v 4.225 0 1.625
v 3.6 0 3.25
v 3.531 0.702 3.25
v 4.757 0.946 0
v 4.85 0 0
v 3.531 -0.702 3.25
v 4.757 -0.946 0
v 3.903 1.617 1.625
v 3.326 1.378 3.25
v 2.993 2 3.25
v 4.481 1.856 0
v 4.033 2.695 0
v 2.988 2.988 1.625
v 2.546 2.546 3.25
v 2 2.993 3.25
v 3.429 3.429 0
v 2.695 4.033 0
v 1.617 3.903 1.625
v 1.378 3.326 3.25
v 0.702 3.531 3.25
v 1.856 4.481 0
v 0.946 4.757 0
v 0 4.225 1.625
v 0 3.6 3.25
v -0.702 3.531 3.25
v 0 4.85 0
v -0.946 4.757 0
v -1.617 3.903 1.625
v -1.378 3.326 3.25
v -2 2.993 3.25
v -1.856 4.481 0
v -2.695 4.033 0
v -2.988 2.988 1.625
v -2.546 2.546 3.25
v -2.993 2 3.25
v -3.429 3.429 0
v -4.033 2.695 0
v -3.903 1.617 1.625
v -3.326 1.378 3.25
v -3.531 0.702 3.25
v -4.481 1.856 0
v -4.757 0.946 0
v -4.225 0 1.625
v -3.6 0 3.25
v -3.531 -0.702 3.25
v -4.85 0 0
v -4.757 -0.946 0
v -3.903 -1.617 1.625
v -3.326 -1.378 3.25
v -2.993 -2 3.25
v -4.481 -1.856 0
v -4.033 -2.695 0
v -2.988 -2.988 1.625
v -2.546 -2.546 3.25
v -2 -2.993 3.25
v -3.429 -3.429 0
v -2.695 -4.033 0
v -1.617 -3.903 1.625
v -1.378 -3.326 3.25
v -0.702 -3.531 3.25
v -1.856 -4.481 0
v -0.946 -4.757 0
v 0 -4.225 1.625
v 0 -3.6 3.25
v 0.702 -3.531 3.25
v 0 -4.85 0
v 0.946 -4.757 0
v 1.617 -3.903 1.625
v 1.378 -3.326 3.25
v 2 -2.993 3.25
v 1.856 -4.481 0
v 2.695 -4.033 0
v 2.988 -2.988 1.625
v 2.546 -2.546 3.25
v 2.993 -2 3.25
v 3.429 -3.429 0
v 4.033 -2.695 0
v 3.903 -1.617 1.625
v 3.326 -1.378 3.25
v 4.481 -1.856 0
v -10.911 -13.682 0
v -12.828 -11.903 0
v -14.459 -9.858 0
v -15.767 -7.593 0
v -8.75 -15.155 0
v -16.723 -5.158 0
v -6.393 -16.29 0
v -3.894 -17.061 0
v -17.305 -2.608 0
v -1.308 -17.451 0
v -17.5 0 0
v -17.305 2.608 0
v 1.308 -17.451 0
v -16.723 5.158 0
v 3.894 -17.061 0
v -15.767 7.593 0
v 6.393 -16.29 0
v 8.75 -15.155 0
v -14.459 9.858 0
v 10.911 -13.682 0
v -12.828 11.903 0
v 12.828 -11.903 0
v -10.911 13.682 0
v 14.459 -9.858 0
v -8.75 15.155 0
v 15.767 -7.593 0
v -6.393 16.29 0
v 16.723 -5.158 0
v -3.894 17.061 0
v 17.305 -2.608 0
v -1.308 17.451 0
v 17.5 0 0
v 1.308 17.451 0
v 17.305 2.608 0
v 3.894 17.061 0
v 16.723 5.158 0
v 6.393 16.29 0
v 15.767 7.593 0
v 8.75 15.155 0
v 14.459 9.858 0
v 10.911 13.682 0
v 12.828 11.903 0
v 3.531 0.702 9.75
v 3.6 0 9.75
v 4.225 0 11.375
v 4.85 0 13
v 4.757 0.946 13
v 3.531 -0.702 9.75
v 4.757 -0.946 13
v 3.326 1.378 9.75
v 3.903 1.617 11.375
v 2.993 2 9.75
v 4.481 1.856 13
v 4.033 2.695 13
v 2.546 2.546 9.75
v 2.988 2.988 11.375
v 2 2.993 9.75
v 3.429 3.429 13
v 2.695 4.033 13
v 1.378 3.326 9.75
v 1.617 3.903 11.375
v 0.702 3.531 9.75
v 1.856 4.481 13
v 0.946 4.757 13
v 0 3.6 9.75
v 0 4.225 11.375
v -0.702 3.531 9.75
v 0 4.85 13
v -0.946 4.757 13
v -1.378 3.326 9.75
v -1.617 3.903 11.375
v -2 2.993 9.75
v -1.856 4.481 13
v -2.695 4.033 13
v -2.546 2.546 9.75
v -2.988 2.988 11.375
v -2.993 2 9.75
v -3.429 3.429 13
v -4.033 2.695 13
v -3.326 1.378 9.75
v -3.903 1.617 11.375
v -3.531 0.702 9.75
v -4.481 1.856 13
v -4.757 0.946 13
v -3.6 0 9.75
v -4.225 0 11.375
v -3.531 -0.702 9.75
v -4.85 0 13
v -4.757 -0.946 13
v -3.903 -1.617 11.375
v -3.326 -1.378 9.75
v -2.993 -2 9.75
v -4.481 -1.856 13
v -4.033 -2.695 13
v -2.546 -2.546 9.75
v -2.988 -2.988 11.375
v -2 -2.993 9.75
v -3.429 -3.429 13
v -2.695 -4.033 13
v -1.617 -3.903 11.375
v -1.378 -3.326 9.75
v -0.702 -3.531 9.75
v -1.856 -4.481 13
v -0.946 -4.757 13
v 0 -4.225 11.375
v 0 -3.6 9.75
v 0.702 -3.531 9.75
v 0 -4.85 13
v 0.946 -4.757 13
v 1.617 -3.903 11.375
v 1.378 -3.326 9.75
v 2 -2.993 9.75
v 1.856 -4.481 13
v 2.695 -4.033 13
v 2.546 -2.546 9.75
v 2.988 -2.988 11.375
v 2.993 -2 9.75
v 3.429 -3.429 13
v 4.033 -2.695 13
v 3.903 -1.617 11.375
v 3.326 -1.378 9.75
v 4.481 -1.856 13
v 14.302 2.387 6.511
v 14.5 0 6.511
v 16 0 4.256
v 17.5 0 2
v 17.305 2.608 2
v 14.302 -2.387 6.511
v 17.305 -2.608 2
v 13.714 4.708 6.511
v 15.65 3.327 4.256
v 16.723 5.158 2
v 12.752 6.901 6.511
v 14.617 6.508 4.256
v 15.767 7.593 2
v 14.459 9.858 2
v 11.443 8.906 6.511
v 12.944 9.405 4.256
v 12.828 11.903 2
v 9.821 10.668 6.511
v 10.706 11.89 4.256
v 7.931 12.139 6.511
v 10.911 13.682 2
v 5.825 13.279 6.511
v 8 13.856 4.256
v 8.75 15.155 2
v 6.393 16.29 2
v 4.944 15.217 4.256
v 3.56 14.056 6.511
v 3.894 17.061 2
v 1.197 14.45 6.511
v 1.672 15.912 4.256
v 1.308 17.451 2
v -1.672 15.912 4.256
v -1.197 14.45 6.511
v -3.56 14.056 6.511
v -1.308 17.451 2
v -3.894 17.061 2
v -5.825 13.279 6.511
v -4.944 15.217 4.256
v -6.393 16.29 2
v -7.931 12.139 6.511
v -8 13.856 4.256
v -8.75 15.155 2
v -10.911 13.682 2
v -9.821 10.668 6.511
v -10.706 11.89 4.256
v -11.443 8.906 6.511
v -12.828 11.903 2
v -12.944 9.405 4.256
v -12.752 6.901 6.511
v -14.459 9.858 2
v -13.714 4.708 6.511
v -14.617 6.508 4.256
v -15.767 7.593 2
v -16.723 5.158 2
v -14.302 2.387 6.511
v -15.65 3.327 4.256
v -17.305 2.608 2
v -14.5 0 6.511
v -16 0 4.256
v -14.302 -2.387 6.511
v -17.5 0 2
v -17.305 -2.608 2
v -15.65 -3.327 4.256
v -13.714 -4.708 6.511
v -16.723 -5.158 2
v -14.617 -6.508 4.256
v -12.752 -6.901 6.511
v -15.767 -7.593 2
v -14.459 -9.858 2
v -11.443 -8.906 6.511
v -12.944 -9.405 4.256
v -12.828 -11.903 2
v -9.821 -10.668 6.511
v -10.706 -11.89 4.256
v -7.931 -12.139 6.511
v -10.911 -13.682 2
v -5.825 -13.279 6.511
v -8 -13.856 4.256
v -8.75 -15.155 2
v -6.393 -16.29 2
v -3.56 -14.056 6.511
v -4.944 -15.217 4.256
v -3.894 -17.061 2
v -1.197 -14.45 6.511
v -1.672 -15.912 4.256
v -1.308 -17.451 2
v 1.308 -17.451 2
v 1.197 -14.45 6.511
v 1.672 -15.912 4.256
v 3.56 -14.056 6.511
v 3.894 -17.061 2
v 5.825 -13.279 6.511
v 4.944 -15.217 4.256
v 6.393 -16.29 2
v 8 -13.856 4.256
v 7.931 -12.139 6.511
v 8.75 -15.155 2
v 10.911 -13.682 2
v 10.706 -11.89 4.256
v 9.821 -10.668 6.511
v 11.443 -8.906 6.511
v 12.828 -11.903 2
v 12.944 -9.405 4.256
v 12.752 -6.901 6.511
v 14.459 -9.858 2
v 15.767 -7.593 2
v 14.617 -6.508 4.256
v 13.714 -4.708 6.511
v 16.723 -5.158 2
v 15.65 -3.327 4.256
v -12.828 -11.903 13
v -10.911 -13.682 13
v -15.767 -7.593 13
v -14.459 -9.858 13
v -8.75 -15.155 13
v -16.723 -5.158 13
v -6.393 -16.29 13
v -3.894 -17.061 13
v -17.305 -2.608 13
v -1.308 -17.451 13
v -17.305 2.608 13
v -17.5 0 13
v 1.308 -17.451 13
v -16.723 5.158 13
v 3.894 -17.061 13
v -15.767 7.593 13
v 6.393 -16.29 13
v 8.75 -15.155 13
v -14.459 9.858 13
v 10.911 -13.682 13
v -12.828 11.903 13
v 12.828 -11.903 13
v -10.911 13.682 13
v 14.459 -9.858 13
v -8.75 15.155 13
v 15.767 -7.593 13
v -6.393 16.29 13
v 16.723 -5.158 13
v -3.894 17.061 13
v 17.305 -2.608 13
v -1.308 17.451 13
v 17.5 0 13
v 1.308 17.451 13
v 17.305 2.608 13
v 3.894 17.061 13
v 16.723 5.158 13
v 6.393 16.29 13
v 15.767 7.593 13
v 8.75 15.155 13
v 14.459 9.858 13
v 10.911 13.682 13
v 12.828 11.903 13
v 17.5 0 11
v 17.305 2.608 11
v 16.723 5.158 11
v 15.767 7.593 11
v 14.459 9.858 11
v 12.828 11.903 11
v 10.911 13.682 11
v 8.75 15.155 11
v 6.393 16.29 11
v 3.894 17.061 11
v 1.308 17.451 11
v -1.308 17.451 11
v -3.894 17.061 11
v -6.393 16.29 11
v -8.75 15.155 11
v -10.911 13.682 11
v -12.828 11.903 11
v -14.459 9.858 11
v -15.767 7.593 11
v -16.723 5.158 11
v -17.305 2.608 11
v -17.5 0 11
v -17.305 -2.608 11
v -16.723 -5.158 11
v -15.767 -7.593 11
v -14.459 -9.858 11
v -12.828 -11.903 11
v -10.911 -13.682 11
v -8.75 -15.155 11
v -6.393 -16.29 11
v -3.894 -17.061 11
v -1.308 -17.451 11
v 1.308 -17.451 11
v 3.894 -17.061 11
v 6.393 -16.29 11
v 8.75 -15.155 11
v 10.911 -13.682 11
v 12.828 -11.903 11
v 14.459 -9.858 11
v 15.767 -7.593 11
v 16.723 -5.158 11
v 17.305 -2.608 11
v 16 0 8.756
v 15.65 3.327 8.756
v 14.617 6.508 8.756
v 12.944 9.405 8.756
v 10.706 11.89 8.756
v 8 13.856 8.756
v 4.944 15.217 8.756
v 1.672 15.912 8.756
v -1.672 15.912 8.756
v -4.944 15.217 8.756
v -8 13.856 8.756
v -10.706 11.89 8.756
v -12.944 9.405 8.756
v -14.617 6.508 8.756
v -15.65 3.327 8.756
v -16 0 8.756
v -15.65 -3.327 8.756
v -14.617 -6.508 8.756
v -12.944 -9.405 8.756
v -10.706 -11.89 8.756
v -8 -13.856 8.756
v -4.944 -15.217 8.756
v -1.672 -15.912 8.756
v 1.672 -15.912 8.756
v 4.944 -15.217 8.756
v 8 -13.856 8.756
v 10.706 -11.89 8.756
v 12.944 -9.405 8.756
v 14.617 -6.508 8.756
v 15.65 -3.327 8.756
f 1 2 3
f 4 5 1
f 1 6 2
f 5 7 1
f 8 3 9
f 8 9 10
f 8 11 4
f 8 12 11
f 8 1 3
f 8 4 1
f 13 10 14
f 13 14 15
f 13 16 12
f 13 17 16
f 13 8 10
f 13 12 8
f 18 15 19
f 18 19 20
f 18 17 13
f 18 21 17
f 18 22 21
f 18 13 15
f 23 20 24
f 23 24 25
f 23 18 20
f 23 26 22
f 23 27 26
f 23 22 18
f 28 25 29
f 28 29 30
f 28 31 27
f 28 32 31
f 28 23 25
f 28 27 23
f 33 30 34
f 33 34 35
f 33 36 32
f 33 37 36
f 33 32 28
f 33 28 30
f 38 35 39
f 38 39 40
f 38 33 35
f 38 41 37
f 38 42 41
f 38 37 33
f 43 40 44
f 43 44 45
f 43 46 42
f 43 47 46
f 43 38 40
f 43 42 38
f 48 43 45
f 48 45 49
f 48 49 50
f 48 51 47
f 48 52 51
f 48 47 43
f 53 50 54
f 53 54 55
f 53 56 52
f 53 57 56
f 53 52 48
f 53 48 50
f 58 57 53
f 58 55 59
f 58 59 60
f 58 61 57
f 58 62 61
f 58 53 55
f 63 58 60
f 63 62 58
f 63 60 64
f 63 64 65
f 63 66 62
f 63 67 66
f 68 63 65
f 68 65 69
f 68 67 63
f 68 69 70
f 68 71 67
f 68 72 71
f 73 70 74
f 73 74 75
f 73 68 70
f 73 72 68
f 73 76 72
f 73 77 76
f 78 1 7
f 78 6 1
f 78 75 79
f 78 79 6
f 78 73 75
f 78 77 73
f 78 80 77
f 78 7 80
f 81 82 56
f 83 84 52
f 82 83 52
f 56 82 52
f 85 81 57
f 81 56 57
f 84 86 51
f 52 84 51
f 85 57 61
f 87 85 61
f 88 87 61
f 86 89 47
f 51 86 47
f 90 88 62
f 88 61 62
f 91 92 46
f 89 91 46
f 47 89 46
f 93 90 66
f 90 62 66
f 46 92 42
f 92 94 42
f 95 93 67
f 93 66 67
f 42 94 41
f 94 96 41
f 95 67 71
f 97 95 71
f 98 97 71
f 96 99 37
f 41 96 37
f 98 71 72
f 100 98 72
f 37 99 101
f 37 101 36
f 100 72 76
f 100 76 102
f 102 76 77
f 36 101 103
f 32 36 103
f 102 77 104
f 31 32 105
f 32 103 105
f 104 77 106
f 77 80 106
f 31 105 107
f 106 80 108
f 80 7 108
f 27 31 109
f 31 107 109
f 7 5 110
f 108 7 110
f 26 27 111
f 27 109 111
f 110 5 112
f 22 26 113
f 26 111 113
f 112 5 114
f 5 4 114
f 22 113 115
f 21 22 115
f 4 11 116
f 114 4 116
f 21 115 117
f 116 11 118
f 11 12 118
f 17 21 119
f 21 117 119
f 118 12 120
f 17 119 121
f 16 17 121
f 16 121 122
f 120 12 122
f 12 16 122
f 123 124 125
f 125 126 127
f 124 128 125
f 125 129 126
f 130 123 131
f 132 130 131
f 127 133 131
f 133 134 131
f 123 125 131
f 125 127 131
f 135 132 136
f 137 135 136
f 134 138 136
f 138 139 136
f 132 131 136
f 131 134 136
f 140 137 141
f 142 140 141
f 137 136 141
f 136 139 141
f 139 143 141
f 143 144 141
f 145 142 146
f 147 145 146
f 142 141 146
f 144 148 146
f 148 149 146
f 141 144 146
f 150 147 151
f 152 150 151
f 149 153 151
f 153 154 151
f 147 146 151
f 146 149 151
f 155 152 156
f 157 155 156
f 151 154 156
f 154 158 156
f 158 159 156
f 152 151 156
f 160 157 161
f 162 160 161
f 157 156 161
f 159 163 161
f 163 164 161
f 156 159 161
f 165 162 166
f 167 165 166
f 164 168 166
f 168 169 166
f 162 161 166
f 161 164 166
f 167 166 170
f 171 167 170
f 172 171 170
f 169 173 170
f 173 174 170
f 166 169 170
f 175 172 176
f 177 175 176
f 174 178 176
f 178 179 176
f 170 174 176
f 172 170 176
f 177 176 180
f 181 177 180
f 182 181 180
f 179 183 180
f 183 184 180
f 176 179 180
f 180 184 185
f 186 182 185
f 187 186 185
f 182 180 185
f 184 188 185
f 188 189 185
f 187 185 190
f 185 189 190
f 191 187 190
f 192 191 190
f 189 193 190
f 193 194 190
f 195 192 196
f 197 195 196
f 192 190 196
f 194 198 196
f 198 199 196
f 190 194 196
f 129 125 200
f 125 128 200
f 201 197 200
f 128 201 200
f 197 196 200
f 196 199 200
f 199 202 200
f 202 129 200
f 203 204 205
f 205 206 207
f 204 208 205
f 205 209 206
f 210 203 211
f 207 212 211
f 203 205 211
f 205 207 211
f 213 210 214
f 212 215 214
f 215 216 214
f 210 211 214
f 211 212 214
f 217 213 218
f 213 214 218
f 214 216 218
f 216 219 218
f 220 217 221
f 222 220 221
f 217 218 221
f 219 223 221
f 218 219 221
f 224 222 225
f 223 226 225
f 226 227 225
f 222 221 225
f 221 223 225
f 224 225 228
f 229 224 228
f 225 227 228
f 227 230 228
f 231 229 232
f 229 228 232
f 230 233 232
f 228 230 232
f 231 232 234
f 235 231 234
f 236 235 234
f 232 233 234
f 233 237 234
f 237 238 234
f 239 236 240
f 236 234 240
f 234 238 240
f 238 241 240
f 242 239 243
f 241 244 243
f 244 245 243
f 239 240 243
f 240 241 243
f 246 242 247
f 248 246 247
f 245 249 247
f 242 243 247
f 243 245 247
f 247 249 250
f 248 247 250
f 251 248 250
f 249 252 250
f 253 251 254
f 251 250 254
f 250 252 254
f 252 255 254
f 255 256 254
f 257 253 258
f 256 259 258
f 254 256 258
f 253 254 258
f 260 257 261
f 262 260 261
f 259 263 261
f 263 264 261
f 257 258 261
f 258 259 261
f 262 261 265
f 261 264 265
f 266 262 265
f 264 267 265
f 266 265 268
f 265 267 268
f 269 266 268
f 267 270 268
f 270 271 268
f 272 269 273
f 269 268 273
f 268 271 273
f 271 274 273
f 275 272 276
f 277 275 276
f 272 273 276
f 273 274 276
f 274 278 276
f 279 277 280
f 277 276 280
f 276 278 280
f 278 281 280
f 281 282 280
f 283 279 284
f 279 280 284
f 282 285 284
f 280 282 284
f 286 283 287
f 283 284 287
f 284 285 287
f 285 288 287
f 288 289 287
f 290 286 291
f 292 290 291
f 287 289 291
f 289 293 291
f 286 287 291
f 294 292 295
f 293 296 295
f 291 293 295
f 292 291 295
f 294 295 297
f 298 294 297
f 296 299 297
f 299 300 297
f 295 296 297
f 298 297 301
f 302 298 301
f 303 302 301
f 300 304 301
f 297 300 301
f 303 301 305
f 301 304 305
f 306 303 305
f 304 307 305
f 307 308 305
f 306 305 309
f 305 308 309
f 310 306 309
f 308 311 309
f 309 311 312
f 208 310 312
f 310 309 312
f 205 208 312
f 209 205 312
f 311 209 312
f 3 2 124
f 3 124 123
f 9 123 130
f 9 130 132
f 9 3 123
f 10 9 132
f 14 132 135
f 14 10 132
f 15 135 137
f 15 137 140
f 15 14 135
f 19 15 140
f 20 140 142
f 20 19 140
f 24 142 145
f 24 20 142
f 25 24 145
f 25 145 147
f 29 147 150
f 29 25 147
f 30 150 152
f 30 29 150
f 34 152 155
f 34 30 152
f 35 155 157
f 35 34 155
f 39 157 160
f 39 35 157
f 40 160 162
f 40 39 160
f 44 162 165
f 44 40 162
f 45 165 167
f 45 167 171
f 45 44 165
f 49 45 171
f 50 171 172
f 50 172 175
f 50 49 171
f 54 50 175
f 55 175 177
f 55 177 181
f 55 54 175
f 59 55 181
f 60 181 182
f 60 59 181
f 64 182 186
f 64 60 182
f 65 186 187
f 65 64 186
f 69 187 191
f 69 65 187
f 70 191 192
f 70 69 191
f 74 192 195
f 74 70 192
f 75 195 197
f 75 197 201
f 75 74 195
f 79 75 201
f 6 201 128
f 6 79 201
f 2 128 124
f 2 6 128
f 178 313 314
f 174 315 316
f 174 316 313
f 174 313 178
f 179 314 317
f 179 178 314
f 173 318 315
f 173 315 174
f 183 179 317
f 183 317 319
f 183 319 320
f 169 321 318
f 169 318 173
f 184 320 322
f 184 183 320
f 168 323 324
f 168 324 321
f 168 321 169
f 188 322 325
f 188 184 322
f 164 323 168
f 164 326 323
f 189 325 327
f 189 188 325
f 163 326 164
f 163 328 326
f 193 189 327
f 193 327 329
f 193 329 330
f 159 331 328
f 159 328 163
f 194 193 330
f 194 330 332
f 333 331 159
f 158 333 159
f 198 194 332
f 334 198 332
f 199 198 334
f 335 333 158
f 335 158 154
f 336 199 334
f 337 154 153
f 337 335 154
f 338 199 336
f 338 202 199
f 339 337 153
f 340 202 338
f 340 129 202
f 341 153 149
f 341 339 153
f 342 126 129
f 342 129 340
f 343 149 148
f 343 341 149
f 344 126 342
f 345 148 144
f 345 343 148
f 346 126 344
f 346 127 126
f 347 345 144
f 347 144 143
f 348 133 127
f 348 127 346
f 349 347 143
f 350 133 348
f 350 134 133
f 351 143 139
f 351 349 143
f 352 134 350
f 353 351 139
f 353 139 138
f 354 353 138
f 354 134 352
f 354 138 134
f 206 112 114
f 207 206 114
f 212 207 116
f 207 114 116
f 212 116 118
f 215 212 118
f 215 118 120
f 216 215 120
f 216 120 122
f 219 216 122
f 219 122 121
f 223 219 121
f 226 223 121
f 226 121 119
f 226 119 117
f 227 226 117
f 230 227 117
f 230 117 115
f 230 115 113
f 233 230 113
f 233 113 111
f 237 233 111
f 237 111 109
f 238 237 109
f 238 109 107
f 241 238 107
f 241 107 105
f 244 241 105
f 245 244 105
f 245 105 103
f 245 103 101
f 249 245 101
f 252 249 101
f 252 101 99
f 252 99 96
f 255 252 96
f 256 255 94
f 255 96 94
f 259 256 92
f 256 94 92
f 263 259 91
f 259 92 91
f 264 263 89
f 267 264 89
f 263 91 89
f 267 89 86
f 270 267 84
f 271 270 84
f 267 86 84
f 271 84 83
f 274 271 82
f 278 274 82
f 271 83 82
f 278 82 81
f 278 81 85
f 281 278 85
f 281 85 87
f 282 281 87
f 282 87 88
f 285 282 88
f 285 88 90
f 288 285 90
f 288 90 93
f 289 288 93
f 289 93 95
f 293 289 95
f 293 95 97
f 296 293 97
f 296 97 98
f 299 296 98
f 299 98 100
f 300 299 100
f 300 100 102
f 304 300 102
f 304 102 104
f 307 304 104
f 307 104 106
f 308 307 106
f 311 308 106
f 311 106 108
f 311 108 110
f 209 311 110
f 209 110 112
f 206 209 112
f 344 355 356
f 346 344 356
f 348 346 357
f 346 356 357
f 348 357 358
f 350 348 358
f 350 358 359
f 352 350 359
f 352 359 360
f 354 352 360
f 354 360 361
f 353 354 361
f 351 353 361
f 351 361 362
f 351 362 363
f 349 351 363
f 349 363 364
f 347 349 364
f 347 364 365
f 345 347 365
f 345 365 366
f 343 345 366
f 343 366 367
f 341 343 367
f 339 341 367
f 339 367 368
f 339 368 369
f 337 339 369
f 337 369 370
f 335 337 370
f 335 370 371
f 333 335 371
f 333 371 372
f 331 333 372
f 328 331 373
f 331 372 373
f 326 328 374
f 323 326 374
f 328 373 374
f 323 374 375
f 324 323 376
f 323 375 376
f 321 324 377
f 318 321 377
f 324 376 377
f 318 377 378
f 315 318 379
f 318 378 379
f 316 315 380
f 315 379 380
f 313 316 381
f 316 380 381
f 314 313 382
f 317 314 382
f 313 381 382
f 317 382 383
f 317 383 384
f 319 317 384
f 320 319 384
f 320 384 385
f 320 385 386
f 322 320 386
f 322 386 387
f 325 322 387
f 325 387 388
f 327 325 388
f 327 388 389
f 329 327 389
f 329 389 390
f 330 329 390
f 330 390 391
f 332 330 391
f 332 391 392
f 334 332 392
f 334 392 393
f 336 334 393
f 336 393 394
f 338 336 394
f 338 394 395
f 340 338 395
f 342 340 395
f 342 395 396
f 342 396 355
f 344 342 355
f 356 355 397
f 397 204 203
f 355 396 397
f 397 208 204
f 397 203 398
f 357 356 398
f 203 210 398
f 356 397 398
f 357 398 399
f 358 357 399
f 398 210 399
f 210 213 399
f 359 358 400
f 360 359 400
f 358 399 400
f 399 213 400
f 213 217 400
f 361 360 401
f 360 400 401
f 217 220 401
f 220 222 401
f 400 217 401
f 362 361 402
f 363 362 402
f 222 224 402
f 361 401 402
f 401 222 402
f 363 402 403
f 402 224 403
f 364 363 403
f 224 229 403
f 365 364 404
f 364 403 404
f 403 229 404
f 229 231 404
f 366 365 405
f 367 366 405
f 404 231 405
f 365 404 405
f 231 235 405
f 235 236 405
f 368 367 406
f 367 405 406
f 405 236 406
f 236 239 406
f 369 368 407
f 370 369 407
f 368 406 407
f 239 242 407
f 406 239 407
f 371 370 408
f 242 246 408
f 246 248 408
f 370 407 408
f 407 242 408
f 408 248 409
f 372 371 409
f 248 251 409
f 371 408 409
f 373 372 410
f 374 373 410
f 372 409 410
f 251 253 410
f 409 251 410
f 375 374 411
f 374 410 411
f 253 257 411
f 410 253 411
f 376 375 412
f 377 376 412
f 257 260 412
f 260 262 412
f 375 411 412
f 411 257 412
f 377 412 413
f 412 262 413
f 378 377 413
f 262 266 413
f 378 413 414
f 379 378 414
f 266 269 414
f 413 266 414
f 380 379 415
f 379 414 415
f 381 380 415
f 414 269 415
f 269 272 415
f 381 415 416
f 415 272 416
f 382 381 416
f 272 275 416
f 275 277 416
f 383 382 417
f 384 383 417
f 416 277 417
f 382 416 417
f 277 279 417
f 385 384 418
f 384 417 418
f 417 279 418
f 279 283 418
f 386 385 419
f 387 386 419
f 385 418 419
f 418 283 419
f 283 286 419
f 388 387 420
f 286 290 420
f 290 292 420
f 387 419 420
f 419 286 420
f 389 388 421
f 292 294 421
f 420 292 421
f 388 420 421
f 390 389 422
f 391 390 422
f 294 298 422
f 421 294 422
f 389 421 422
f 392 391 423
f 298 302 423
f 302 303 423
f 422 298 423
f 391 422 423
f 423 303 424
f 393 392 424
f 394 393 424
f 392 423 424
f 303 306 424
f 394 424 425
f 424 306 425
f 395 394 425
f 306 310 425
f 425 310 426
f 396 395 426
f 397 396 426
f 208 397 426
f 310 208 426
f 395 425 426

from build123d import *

# Parameters (mm, degrees)
F0_R     = 17.5
F0_R_2   = 3.6
F1_DEPTH = 13
F4_SIZE2 = 1.25
F4_SIZE  = 3.25


with BuildPart() as f1:
    # F0 (on Top) → F1 (new body)
    with BuildSketch(Plane.XY):
        Circle(F0_R)
        Circle(F0_R_2, mode=Mode.SUBTRACT)
    extrude(amount=F1_DEPTH)

    # F2 (on Front) → F3 (revolve, cut)
    with BuildSketch(Plane.XZ):
        Polygon((17.5, 2), (17.5, 11), (14.5, 6.5113911405), align=None)
    revolve(axis=Axis((0, 0, 0), (0, 0, 1)), mode=Mode.SUBTRACT)

    # F4
    f4_edges = [f1.edges().sort_by_distance(p)[0] for p in [
        (-3.6, 0, 13),
        (-3.6, 0, 0),
    ]]
    f4_side = f1.faces().sort_by_distance((-3.6, 0, 6.5))[0]
    chamfer(f4_edges, length=F4_SIZE, length2=F4_SIZE2, reference=f4_side)


solid = f1.part
